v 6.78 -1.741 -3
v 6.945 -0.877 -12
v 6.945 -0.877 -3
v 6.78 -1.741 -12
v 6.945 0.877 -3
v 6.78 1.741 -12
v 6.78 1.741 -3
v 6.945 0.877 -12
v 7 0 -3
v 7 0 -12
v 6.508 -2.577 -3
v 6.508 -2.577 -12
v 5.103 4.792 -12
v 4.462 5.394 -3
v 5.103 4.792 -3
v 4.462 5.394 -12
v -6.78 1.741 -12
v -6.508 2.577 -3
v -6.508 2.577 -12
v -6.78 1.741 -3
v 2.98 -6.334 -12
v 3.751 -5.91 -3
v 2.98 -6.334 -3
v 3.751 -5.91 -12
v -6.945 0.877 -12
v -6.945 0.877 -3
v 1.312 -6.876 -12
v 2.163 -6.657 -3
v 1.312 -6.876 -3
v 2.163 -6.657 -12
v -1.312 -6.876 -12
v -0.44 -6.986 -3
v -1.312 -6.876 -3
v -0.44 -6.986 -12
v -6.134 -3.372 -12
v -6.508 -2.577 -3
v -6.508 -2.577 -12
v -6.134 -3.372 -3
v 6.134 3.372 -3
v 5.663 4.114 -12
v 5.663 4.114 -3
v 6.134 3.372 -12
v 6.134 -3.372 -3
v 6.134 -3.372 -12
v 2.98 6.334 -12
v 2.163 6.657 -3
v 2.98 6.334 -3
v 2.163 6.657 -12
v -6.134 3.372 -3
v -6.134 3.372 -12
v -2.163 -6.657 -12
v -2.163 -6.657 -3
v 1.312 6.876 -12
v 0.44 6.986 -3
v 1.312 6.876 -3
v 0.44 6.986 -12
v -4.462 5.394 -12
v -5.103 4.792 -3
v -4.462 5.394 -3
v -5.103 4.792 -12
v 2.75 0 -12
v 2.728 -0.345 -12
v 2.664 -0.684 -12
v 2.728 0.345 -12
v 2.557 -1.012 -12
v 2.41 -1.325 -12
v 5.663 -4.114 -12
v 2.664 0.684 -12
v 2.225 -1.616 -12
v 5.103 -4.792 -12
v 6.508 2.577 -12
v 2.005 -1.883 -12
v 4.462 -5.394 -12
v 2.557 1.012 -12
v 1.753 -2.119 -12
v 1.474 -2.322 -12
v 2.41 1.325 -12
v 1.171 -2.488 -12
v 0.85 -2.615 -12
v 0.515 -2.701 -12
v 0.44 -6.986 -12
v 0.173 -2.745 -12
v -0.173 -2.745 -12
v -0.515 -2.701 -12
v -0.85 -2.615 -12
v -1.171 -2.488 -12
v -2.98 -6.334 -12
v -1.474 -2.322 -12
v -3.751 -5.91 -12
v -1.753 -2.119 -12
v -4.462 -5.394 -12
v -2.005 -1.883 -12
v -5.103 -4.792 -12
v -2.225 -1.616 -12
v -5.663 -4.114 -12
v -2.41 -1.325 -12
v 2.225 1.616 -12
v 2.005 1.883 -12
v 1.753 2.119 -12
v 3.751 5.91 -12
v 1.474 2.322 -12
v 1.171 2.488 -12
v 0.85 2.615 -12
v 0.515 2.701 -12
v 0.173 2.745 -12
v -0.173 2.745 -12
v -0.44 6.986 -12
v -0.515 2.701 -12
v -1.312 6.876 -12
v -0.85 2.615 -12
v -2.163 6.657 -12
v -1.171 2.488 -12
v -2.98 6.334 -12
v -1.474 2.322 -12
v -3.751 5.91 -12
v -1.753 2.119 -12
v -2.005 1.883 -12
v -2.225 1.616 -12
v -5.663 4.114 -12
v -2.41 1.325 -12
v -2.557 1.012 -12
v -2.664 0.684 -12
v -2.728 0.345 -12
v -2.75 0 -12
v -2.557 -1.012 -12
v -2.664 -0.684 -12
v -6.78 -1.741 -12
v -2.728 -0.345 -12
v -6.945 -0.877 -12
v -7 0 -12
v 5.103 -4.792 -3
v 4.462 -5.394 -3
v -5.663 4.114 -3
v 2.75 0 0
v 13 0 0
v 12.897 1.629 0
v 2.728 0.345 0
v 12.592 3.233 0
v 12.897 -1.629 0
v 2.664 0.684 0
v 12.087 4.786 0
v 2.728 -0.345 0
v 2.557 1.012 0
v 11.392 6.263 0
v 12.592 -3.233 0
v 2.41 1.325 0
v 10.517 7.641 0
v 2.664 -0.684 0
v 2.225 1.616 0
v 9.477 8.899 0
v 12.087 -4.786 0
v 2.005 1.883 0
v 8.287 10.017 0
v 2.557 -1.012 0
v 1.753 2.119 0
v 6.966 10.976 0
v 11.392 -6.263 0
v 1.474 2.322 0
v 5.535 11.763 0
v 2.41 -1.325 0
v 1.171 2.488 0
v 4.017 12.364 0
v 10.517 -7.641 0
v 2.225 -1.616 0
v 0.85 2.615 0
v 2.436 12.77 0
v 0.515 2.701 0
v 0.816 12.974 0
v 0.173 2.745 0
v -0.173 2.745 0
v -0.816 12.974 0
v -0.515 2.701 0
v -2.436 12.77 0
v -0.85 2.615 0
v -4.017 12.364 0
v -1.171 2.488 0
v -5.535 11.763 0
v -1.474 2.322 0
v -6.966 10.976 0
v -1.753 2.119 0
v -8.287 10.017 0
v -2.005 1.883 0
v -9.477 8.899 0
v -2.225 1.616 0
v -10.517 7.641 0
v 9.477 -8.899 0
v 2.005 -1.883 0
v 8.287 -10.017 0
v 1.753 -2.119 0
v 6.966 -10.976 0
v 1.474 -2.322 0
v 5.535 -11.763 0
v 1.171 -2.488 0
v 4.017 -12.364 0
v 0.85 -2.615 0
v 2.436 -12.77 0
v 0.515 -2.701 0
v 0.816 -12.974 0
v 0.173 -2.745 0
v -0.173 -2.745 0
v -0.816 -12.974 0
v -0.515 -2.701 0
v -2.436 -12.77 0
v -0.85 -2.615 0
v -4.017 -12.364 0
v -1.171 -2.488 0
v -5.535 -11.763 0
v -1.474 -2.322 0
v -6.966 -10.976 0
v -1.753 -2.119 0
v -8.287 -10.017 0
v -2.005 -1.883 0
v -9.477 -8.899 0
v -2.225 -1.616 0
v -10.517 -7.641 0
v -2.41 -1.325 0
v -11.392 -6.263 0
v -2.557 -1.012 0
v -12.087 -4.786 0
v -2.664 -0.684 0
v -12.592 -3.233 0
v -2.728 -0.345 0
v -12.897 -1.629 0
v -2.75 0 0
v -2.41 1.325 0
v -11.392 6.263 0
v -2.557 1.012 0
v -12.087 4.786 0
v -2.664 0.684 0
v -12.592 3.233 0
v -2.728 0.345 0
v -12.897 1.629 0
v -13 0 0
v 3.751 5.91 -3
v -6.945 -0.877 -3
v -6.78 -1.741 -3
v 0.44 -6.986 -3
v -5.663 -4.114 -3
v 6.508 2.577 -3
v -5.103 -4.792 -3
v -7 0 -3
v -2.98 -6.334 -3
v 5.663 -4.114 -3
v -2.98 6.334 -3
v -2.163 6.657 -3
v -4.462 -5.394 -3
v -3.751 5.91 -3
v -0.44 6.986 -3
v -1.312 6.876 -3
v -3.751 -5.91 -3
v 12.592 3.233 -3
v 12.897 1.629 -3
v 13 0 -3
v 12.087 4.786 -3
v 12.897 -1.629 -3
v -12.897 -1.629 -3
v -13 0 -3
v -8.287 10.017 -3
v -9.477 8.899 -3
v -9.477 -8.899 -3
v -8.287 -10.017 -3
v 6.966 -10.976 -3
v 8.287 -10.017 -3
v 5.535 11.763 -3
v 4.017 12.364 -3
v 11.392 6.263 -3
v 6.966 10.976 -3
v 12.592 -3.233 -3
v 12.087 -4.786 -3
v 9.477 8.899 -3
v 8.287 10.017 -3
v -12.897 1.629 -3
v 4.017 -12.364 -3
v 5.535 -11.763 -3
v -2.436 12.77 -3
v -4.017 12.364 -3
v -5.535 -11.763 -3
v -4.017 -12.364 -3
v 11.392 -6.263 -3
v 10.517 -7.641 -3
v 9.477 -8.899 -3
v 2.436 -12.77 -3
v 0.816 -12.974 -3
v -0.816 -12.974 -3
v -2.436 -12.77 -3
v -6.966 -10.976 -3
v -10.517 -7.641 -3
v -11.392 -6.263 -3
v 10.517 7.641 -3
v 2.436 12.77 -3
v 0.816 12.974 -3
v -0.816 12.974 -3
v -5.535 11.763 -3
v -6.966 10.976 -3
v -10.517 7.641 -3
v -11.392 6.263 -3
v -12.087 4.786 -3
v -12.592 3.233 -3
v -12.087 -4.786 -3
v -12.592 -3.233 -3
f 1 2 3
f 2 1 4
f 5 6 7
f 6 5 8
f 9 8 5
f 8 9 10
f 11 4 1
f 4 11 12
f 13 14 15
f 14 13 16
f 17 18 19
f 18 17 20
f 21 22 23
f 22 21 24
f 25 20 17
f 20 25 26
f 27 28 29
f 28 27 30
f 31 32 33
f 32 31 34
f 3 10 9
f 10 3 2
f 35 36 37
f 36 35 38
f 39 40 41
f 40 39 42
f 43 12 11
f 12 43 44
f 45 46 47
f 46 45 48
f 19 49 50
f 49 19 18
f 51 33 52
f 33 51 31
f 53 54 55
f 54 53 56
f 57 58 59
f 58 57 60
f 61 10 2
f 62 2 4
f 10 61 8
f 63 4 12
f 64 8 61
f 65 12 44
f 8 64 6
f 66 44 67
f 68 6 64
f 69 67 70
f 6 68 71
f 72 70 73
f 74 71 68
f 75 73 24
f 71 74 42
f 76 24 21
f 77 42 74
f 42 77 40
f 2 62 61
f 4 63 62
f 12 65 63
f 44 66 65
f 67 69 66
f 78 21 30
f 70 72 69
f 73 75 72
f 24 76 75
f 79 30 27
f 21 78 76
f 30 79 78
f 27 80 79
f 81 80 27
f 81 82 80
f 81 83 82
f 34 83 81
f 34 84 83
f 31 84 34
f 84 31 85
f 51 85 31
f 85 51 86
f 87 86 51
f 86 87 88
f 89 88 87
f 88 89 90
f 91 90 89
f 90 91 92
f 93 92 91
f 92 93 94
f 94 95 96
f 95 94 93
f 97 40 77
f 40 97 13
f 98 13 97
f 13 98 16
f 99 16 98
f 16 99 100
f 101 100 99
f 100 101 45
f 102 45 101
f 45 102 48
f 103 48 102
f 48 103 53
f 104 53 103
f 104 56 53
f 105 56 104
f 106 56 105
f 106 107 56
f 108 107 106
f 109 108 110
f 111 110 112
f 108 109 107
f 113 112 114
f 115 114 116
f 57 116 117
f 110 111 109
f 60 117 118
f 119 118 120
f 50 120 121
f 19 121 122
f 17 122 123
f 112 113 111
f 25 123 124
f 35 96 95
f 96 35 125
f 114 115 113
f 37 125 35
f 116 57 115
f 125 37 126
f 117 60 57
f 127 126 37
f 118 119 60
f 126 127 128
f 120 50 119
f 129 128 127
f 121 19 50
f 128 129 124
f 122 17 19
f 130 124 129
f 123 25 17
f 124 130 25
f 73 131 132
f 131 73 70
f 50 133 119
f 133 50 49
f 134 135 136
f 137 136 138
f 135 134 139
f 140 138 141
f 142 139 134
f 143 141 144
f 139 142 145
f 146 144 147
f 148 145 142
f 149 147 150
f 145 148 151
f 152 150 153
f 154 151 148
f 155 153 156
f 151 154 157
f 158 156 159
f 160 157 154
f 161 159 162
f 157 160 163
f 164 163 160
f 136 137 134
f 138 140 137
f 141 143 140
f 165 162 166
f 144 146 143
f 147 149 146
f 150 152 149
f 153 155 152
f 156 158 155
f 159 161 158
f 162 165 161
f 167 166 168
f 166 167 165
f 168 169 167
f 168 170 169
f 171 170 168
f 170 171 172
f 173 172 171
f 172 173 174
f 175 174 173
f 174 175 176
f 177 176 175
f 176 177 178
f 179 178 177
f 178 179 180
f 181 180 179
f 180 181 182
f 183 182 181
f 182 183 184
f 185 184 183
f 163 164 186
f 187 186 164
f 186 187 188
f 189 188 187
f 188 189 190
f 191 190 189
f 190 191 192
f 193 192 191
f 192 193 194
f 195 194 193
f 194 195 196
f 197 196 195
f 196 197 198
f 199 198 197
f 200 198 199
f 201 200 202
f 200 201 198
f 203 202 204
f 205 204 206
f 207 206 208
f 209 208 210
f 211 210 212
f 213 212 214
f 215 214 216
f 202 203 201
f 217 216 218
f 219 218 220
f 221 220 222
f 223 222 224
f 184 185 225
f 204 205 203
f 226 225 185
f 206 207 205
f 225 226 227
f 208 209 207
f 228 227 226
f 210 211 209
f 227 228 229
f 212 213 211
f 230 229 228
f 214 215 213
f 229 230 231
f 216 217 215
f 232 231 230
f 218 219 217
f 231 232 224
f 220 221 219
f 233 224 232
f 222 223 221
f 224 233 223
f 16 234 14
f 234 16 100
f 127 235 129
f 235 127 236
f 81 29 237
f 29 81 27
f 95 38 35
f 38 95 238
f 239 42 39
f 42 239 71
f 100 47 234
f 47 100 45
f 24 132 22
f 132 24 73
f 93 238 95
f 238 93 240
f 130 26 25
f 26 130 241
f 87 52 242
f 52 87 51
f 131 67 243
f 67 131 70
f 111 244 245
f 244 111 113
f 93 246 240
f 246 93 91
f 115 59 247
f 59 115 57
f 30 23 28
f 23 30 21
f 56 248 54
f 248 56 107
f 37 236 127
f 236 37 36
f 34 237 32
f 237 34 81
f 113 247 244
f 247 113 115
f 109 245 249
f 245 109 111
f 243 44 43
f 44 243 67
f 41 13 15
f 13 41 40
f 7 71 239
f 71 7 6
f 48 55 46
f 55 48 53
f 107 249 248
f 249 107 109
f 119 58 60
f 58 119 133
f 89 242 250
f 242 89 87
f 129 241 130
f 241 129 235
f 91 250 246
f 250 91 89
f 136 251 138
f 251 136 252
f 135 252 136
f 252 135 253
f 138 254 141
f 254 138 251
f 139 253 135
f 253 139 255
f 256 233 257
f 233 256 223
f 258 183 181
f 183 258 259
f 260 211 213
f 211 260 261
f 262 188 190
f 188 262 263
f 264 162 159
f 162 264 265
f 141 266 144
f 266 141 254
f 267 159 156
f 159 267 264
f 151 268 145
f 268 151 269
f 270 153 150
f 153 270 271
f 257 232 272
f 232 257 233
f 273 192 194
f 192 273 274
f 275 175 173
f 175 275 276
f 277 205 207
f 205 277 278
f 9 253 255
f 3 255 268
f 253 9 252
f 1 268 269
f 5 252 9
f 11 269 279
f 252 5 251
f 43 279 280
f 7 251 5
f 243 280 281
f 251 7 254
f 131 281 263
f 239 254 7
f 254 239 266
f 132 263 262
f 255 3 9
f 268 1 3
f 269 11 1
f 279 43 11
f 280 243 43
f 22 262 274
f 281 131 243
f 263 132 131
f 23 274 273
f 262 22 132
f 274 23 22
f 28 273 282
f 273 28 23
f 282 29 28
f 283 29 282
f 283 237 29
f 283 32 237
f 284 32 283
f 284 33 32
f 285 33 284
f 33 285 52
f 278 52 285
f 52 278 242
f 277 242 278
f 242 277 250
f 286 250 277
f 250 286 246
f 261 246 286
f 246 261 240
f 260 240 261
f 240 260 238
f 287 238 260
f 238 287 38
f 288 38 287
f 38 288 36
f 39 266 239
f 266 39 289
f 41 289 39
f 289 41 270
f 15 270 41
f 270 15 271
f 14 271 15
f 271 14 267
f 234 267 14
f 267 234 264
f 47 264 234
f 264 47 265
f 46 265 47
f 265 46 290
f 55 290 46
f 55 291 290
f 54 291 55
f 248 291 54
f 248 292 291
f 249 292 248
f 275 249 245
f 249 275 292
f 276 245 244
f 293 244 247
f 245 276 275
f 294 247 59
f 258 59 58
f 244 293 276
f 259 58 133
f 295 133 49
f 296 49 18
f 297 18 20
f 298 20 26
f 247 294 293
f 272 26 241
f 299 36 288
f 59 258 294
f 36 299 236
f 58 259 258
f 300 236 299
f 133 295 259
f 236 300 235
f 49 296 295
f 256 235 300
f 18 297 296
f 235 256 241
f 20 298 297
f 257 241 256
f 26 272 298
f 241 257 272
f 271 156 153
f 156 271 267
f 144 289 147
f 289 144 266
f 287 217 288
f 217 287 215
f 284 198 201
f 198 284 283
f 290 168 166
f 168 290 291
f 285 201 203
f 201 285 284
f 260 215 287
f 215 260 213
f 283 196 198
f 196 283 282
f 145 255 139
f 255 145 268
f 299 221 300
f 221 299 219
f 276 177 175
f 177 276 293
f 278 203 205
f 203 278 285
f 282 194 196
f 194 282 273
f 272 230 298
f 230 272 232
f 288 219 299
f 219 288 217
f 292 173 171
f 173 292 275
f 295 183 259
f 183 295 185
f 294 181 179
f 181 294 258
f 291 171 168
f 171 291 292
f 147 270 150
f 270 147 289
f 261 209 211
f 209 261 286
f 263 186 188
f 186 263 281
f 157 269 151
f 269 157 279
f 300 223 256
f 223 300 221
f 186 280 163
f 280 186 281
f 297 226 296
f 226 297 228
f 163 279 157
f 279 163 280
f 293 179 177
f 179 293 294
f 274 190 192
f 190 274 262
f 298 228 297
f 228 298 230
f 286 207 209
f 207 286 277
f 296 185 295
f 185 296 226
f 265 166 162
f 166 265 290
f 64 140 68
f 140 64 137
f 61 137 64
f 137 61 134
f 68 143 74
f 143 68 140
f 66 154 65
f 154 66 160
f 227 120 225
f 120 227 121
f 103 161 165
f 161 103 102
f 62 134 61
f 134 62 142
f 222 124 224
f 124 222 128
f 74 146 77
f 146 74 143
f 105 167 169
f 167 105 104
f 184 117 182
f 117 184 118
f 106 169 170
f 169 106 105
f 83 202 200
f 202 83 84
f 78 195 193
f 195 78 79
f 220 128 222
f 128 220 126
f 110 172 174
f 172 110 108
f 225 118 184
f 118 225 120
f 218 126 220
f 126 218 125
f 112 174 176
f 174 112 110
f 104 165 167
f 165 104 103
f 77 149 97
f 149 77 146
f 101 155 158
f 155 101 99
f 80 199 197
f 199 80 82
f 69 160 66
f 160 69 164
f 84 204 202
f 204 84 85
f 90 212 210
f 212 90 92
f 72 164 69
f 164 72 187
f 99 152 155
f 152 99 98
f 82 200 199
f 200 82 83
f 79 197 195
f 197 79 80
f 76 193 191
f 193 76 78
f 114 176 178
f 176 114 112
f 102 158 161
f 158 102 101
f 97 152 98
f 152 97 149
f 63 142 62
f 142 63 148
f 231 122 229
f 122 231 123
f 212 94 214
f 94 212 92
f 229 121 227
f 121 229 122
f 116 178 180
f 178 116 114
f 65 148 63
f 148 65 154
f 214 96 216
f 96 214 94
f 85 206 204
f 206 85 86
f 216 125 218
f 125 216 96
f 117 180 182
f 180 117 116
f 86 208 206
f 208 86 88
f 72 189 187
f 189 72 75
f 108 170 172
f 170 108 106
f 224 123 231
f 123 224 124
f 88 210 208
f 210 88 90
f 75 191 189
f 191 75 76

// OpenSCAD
$fn = 50;


difference() {
	union() {
		translate(v = [0, 0, -12.0000000000]) {
			cylinder(h = 12, r = 7.0000000000);
		}
		translate(v = [0, 0, -3.0000000000]) {
			cylinder(h = 3, r = 13.0000000000);
		}
	}
	union() {
		#translate(v = [0, 0, -12]) {
			cylinder(h = 12, r = 2.7500000000);
		}
	}
}
